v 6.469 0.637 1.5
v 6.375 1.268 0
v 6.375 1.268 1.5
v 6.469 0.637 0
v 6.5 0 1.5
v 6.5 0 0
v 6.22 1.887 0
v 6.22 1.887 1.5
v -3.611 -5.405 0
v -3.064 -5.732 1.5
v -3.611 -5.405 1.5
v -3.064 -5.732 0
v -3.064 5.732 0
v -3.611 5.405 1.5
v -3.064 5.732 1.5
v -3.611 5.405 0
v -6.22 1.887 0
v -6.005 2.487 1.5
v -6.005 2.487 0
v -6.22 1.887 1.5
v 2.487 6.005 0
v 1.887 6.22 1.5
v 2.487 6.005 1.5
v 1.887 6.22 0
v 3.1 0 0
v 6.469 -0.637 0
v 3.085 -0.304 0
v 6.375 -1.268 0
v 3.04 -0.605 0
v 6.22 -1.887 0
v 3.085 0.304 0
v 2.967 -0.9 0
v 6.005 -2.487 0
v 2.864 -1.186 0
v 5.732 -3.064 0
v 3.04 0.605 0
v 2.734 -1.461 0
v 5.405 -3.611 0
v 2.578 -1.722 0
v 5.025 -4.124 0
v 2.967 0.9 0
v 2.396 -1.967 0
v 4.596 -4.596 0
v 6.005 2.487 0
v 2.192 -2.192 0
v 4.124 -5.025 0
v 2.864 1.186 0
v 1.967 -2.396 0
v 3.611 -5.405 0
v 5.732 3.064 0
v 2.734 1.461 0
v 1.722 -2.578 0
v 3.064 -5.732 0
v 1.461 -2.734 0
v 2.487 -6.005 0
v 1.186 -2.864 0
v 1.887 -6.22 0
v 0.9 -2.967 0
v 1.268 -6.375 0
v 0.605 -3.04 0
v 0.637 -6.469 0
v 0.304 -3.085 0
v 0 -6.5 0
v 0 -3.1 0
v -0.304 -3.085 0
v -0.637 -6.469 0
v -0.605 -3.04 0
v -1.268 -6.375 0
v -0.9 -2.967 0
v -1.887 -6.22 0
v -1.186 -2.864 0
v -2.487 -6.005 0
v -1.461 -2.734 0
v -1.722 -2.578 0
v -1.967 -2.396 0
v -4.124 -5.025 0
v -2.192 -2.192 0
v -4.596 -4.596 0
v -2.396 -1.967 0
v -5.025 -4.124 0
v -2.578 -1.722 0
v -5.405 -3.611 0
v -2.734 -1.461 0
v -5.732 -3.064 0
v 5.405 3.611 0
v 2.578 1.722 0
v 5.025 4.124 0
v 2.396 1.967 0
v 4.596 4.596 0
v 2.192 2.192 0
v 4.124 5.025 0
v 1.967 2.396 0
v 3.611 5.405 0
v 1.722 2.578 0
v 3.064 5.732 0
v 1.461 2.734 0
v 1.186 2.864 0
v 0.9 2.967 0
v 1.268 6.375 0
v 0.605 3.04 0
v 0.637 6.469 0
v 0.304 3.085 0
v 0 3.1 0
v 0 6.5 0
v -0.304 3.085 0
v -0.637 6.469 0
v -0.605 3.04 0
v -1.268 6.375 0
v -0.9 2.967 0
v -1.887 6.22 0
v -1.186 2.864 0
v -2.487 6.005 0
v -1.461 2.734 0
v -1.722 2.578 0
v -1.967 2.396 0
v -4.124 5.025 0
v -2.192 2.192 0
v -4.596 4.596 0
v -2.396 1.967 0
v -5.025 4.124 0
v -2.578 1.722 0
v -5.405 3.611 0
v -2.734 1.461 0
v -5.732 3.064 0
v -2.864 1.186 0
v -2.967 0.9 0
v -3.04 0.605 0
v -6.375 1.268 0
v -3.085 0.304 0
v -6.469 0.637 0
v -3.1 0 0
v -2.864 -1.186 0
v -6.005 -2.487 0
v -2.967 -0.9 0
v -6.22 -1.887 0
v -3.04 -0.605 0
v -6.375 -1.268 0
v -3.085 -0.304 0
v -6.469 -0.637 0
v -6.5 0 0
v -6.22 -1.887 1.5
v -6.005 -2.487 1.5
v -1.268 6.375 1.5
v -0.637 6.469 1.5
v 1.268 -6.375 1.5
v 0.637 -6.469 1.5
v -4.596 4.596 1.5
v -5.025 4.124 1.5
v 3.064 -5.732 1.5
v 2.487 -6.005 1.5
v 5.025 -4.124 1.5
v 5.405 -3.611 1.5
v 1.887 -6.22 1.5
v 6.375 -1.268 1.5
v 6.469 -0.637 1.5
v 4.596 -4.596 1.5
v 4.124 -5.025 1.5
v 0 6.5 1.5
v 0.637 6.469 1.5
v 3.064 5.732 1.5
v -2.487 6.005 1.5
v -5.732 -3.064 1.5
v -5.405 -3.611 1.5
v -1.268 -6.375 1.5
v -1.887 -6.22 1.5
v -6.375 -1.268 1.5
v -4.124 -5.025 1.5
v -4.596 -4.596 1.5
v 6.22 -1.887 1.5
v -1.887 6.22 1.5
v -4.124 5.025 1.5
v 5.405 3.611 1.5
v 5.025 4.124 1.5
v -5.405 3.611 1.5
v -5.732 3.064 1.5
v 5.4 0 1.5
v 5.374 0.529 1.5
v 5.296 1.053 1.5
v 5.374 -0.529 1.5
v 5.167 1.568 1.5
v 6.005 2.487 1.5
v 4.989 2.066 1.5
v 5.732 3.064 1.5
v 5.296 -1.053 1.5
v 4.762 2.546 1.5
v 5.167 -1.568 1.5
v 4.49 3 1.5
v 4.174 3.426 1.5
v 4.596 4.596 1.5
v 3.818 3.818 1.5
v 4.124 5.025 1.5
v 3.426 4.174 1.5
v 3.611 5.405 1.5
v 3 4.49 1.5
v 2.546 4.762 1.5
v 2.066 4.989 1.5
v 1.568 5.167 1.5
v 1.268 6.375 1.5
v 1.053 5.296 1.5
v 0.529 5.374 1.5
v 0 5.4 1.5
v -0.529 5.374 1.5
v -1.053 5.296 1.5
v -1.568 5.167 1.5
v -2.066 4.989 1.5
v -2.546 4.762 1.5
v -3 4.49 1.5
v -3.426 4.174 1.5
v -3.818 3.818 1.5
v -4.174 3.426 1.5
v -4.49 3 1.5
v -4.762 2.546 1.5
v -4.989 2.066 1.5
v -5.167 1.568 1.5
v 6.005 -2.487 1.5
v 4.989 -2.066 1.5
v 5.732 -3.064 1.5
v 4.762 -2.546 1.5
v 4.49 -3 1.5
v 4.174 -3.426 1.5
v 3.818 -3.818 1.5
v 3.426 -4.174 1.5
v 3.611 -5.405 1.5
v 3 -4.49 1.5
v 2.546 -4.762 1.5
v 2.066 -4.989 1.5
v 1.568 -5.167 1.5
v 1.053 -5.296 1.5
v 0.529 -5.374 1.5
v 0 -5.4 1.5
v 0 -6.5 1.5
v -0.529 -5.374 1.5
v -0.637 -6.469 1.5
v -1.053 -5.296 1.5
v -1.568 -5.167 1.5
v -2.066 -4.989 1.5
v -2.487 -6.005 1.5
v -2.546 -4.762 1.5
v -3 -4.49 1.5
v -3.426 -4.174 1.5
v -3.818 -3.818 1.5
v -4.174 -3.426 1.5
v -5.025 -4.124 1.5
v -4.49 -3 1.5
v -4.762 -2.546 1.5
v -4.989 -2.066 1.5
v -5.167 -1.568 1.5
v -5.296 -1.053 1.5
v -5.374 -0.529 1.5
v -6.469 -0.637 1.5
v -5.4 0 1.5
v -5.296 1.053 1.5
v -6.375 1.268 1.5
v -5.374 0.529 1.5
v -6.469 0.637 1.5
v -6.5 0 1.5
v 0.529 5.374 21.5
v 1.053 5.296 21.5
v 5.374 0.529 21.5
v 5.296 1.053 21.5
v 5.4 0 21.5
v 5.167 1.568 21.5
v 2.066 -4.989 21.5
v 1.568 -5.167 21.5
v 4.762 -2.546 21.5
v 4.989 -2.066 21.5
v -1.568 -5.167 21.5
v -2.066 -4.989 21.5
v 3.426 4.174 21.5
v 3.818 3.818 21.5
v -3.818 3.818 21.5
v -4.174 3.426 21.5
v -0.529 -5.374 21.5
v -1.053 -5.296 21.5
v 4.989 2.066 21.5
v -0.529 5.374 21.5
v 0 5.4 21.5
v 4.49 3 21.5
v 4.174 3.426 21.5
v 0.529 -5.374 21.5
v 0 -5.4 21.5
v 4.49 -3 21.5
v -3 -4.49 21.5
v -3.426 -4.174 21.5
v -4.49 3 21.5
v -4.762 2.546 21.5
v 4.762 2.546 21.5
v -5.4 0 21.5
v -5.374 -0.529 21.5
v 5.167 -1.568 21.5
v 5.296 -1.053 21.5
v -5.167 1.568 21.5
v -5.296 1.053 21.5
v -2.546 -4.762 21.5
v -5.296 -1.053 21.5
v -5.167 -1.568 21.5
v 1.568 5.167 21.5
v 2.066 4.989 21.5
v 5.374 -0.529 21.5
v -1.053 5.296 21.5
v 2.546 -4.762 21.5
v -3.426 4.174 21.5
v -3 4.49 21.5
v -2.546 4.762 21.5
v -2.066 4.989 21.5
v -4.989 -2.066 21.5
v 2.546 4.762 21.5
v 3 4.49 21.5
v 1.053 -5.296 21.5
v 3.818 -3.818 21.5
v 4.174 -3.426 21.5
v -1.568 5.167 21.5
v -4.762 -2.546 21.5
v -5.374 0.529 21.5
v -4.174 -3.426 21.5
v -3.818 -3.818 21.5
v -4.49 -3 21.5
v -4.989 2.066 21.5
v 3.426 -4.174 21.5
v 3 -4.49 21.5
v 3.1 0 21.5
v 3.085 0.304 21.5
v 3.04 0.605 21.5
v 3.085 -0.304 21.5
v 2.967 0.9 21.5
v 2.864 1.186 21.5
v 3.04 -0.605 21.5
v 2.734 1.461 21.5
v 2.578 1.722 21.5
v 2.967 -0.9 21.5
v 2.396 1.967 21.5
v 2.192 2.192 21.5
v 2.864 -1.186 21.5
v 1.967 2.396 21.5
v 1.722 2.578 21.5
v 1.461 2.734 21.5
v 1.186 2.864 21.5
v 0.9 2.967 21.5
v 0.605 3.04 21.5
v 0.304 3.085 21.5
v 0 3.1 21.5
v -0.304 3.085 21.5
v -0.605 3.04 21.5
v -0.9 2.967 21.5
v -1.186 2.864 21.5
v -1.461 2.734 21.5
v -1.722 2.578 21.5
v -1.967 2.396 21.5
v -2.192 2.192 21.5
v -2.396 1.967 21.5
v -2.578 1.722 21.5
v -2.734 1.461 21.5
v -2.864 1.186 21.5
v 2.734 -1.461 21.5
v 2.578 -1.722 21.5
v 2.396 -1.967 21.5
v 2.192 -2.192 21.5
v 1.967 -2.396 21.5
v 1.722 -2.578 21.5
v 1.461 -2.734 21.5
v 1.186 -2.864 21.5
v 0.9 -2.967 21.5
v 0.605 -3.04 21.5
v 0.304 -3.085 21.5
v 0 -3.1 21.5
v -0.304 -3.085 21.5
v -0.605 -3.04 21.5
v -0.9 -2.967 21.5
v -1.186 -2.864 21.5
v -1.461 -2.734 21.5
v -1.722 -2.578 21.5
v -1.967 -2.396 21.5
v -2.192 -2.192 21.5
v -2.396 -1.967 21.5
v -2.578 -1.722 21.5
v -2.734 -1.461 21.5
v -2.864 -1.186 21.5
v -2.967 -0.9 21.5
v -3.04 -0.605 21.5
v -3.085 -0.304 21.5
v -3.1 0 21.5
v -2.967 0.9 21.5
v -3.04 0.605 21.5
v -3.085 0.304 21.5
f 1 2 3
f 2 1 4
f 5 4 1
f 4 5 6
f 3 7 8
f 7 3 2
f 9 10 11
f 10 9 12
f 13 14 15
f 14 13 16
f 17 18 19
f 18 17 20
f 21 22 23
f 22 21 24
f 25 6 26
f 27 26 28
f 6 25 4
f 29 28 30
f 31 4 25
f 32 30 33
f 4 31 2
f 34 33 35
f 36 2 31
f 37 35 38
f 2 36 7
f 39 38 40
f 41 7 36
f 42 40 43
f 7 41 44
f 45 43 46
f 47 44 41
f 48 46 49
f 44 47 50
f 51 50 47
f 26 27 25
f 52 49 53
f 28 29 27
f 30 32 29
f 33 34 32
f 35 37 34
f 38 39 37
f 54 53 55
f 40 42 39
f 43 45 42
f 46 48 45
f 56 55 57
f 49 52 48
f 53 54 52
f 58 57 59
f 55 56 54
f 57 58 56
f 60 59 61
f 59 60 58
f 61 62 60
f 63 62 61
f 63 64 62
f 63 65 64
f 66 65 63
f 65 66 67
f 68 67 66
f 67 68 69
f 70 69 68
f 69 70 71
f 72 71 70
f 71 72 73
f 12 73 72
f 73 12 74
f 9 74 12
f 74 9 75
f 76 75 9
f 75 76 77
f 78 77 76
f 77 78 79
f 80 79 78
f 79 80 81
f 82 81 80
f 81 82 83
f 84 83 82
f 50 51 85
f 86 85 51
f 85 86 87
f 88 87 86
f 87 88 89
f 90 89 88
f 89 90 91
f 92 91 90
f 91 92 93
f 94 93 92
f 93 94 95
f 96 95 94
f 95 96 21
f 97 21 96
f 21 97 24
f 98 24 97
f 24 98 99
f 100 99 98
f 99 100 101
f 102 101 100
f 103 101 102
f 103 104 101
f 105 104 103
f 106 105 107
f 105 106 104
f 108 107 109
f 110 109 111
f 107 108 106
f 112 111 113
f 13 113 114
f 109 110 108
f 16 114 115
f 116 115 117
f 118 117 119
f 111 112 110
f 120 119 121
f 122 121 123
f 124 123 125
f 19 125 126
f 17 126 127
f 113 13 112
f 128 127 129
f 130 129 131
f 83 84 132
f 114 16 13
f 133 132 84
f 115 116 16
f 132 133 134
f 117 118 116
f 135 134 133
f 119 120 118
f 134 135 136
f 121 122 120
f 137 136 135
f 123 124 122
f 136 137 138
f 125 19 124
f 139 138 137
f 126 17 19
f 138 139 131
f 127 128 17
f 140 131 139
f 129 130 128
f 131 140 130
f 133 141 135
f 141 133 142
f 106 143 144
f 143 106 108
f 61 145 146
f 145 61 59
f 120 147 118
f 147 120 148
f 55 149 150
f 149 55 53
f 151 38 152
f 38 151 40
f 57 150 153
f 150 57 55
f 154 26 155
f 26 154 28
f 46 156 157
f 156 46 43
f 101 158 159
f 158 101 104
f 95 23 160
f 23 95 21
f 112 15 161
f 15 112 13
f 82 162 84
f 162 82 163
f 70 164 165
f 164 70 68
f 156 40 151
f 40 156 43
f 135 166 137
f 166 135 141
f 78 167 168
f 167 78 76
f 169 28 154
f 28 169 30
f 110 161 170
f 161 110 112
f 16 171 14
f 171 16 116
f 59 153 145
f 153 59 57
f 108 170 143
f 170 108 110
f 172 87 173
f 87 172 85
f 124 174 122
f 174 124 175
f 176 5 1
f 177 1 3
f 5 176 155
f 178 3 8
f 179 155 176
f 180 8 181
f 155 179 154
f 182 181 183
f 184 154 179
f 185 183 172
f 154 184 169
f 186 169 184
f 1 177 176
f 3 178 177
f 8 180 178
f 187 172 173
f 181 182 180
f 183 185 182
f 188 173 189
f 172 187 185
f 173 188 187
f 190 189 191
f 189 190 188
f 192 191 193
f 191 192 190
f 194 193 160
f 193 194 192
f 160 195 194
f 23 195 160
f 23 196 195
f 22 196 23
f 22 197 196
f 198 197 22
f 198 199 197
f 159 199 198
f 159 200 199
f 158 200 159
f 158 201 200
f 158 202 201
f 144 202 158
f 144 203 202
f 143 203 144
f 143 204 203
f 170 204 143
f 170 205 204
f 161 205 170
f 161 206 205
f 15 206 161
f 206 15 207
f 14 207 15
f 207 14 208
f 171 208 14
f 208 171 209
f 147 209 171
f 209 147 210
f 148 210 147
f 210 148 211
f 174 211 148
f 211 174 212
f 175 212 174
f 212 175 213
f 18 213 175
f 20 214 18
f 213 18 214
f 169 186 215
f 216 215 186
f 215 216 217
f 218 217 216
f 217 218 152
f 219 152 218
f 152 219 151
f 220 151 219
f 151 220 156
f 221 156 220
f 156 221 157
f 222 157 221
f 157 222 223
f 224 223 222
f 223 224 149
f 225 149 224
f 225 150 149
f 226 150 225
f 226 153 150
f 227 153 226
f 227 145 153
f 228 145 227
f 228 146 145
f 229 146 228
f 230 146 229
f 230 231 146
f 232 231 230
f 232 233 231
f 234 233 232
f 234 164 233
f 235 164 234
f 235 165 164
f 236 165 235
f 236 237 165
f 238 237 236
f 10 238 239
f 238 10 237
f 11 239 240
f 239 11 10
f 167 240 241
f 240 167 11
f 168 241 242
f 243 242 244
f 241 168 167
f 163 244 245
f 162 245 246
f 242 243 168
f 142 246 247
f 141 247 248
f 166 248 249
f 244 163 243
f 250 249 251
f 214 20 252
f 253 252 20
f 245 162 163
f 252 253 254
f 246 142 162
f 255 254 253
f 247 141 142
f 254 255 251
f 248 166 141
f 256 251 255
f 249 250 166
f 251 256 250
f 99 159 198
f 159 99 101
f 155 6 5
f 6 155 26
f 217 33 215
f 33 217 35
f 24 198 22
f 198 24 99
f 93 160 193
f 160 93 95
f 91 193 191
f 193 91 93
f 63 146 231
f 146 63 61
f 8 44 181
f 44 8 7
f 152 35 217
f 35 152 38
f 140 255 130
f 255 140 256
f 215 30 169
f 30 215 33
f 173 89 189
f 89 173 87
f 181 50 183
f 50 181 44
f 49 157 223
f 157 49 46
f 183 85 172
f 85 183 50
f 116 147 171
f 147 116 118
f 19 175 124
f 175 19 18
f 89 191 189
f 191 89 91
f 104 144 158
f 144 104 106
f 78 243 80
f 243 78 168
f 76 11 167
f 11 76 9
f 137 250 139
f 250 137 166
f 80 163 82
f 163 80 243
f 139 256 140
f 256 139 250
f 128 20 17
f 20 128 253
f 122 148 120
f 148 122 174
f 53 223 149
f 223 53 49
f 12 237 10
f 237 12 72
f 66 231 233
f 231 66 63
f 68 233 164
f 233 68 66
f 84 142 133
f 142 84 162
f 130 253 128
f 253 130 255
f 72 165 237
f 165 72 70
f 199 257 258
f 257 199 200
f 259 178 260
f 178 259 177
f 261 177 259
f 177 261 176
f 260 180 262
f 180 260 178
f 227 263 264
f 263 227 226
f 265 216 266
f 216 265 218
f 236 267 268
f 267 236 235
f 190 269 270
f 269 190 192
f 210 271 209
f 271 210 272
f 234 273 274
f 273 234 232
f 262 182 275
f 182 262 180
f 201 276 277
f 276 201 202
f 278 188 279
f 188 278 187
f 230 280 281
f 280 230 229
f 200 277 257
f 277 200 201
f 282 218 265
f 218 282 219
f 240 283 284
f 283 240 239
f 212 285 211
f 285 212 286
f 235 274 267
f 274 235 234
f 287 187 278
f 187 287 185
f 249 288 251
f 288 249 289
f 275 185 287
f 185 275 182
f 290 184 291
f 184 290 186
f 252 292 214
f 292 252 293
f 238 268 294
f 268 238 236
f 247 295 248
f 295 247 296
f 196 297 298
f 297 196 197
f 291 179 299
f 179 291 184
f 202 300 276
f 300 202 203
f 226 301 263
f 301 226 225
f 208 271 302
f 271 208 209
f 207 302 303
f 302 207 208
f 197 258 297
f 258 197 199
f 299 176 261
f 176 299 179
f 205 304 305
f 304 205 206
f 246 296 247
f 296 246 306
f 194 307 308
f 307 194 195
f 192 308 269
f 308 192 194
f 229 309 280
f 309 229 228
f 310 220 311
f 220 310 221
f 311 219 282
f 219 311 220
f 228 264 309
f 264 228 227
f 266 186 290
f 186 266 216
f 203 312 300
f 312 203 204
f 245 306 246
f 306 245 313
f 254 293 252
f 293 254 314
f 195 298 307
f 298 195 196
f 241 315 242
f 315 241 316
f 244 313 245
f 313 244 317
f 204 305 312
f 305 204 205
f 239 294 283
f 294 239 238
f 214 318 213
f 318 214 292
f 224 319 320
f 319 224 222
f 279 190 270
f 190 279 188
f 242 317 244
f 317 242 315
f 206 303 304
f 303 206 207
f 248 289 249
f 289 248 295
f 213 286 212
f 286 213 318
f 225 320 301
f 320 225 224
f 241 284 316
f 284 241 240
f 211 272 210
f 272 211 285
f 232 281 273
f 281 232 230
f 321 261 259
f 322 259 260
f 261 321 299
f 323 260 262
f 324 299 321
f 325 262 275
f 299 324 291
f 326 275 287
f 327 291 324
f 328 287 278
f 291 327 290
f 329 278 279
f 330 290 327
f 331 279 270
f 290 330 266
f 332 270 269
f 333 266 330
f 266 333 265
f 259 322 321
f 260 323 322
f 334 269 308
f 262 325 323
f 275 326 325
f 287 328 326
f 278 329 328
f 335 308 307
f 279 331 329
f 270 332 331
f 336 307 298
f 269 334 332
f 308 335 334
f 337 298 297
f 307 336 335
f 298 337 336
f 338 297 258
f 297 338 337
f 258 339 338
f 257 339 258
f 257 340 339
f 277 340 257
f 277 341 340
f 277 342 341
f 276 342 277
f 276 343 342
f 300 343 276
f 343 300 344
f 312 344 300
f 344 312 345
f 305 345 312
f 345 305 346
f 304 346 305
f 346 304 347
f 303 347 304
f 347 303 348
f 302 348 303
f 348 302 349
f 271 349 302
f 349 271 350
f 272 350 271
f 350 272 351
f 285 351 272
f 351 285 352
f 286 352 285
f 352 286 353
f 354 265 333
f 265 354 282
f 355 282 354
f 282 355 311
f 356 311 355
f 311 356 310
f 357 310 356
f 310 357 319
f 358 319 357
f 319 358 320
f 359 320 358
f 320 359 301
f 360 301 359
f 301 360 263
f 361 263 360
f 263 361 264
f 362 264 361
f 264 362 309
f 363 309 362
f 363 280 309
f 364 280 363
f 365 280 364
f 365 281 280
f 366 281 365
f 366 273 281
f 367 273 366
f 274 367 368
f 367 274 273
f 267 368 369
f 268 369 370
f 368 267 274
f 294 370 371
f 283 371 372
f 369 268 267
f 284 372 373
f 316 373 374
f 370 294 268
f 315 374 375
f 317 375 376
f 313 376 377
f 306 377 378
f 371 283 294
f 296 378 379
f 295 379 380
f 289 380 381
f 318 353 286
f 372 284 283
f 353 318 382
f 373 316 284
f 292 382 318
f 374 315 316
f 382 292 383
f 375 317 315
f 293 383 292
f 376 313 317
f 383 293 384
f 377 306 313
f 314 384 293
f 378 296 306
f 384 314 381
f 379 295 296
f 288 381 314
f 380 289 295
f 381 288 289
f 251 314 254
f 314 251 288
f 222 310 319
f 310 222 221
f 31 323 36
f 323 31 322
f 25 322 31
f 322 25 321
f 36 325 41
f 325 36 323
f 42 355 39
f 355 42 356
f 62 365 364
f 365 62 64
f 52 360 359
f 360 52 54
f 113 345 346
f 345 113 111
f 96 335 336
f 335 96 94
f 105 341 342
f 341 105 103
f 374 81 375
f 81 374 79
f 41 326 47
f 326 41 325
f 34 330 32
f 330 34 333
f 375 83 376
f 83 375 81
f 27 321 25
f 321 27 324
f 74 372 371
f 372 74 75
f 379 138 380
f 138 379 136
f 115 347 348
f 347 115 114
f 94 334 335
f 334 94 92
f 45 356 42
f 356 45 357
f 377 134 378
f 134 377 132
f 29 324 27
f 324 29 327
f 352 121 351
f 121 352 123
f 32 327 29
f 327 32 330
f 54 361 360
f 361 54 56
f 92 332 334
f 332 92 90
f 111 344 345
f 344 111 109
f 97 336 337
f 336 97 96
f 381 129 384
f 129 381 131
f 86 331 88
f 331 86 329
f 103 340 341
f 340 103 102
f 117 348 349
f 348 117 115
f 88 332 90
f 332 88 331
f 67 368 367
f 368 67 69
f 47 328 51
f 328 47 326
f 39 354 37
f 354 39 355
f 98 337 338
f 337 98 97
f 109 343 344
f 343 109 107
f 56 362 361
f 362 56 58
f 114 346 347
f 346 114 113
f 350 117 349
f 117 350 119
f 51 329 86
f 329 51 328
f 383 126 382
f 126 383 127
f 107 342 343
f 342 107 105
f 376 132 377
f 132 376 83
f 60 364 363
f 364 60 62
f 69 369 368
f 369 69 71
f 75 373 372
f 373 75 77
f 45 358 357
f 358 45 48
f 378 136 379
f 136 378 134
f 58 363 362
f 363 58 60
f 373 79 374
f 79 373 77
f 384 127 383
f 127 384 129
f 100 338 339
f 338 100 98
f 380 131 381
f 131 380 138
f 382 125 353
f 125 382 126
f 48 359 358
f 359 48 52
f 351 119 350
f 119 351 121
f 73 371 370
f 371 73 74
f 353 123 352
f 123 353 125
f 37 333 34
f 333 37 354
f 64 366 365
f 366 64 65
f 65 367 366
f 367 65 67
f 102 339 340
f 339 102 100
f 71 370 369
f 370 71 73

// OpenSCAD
// Adapter sleeve: 0.2 mL PCR tube for a 1.5 mL tube rack hole
// Print orientation: collar down on the bed (z = 0), sleeve up (+Z)

$fn = 64;

// ---- Dimensions (mm) ----
collar_d      = 13;    // collar outer diameter
collar_h      = 1.5;   // collar thickness (z = 0 to 1.5)
sleeve_od     = 10.8;  // sleeve body outer diameter
sleeve_top_z  = 21.5;  // top of sleeve body
bore_d        = 6.2;   // through-bore diameter
eps           = 0.5;   // cutter overshoot past faces

// ---- Model ----
difference() {
    union() {
        // Collar
        cylinder(d = collar_d, h = collar_h);
        // Sleeve body (slightly overlapping collar for a clean union)
        translate([0, 0, collar_h - 0.01])
            cylinder(d = sleeve_od, h = sleeve_top_z - collar_h + 0.01);
    }
    // Full-height through-bore
    translate([0, 0, -eps])
        cylinder(d = bore_d, h = sleeve_top_z + 2 * eps);
}
